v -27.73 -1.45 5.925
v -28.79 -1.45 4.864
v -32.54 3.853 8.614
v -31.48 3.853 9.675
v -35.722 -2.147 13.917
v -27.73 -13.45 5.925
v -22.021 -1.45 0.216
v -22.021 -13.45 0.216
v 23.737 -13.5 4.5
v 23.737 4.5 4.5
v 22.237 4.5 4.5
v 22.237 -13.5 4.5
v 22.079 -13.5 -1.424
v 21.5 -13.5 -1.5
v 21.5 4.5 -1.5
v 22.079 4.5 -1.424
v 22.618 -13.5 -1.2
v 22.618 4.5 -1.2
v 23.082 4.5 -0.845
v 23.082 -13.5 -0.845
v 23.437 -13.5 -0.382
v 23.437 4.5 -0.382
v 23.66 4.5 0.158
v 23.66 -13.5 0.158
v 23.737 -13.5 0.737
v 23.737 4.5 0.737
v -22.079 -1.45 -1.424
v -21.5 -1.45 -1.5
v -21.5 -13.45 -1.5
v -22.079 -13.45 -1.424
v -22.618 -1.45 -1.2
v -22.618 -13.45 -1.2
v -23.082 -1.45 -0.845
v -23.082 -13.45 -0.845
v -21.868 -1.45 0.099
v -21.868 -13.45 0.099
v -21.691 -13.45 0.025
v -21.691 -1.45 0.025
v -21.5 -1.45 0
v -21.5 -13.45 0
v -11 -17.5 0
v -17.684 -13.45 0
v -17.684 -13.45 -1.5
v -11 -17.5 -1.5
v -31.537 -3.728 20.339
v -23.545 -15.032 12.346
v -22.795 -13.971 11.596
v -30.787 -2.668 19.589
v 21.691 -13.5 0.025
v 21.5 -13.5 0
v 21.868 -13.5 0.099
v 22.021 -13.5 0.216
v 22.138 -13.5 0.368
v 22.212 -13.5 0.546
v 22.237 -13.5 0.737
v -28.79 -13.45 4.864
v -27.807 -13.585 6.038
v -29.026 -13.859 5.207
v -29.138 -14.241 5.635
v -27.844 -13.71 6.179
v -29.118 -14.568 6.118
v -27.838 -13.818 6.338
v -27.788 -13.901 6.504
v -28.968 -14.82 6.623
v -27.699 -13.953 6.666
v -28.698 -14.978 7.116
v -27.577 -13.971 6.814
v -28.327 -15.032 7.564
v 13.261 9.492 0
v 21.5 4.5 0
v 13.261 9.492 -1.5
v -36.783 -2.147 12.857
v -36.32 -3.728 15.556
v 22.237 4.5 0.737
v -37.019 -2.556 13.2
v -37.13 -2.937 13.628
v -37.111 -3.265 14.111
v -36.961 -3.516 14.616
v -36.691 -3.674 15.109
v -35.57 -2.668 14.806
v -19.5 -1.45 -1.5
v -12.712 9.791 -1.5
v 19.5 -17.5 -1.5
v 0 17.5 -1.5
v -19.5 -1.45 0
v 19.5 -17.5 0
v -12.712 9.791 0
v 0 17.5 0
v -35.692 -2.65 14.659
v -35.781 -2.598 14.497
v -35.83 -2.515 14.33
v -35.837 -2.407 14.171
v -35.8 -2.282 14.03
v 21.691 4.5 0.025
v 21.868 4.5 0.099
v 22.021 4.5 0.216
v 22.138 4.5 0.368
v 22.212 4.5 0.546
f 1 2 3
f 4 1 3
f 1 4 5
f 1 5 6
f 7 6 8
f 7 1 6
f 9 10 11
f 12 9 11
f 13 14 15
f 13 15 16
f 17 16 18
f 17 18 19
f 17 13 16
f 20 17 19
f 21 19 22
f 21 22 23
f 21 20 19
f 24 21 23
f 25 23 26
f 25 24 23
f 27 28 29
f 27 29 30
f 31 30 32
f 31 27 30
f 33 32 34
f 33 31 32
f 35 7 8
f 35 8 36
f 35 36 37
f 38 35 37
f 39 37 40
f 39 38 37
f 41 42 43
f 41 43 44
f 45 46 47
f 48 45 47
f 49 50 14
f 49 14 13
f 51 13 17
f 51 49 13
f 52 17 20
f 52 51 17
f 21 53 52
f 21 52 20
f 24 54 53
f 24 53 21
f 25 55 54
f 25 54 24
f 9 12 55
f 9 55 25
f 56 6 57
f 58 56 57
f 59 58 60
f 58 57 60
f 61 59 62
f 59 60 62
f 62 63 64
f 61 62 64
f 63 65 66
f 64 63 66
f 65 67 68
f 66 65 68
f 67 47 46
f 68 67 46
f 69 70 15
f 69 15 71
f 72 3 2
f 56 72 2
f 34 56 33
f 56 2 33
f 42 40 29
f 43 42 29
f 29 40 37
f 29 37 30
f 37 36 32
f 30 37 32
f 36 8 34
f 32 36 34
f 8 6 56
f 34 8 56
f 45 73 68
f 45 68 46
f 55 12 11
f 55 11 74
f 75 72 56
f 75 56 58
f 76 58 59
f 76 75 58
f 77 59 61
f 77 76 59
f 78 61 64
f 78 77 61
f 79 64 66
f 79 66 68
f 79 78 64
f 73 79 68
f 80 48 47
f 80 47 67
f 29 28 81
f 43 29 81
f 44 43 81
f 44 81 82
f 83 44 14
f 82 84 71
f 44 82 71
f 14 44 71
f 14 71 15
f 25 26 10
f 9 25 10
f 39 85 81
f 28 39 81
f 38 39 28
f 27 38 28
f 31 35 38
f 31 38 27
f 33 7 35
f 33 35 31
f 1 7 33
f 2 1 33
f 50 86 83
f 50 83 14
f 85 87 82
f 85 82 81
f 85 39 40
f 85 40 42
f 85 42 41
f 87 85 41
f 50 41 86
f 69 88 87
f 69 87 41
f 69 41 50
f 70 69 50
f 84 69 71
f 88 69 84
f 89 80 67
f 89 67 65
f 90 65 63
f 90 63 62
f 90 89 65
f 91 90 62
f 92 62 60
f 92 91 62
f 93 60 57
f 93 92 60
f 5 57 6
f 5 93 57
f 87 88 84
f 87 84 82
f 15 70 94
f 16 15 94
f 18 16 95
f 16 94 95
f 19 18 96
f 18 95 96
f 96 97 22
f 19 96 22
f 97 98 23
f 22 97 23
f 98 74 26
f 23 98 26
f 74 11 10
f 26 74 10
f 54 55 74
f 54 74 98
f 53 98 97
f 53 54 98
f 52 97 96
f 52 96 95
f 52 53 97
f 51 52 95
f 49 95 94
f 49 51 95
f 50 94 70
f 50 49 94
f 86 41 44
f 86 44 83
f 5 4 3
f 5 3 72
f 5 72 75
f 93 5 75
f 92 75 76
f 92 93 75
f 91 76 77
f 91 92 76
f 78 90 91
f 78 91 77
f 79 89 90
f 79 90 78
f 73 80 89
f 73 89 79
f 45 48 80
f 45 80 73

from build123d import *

# Parameters (mm, degrees)
CROQUIS1_W              = 43
CROQUIS1_H              = 35
BRIDA_BASE1_DEPTH       = 1.5
CROQUIS6_W              = 59.566817112
CROQUIS6_H              = 45.88022185
CORTAR_EXTRUIR1_DEPTH   = 10
BRIDA_DE_ARISTA1_DEPTH  = 18
BRIDA_DE_ARISTA2_DEPTH  = 12
CORTAR_EXTRUIR2_DEPTH   = 10
SALIENTE_EXTRUIR1_DEPTH = 1.5
CORTAR_EXTRUIR3_DEPTH   = 10
BRIDA_DE_ARISTA3_DEPTH  = 15.985281374


# Sheet-metal steps are written as plain solids
with BuildPart() as part:
    # Croquis1 → Brida base1 (new body)
    with BuildSketch(Plane.XY):
        Rectangle(CROQUIS1_W, CROQUIS1_H)
    extrude(amount=-BRIDA_BASE1_DEPTH)

    # Croquis6 → Cortar-Extruir1 (cut)
    with BuildSketch(Plane.XY):
        Rectangle(CROQUIS6_W, CROQUIS6_H)
        Polygon((19.5, -17.5), (21.5, -13.5), (21.5, 4.5), (13.260768396, 9.49227982), (0, 17.5), (-12.711890801, 9.791095082), (-19.5, -1.45), (-21.5, -1.45), (-21.5, -13.45), (-17.684098087, -13.45), (-11, -17.5), align=None, mode=Mode.SUBTRACT)
    extrude(amount=-CORTAR_EXTRUIR1_DEPTH, mode=Mode.SUBTRACT)

    # Brida de arista1 section (across the edge) → Brida de arista1 (add)
    with BuildSketch(Plane(origin=(22.2366, -13.5, 0), x_dir=(-1, 0, 0), z_dir=(0, 1, 0))):
        with BuildLine():
            Line((-1.5, 0.7366), (-1.5, 4.5))
            Line((-1.5, 4.5), (0, 4.5))
            Line((0, 4.5), (0, 0.7366))
            ThreePointArc((0, 0.7366), (0.215745145, 0.215745145), (0.7366, 0))
            Line((0.7366, 0), (0.7366, -1.5))
            ThreePointArc((0.7366, -1.5), (-0.844915027, -0.844915027), (-1.5, 0.7366))
        make_face()
    extrude(amount=BRIDA_DE_ARISTA1_DEPTH)

    # Brida de arista2 section (across the edge) → Brida de arista2 (add)
    with BuildSketch(Plane(origin=(-21.80510971, -1.45, 0), x_dir=(0.7071067811865438, 0, 0.7071067811865512), z_dir=(0, -1, 0))):
        with BuildLine():
            Line((-1.5, 0.30510971), (-1.5, 20.378679656))
            Line((-1.5, 20.378679656), (0, 20.378679656))
            Line((0, 20.378679656), (0, 0.30510971))
            ThreePointArc((0, 0.30510971), (0.056070336, 0.023225094), (0.215745145, -0.215745145))
            Line((0.215745145, -0.215745145), (-0.844915027, -1.276405317))
            ThreePointArc((-0.844915027, -1.276405317), (-1.329748962, -0.550800055), (-1.5, 0.30510971))
        make_face()
    extrude(amount=BRIDA_DE_ARISTA2_DEPTH)

    # Croquis13 → Cortar-Extruir2 (cut)
    with BuildSketch(Plane(origin=(-11.963215027, 0, -11.963215027), x_dir=(-0.7071067811865511, 0, 0.707106781186544), z_dir=(-0.707106781186544, 0, -0.7071067811865511))):
        Polygon((35.797220597, -1.45), (21.51312871, -15.734091887), (35.797220597, -15.734091887), align=None)
    extrude(amount=-CORTAR_EXTRUIR2_DEPTH, mode=Mode.SUBTRACT)

    # Croquis14 → Saliente-Extruir1 (add)
    with BuildSketch(Plane(origin=(-11.963215027, 0, -11.963215027), x_dir=(-0.7071067811865511, 0, 0.707106781186544), z_dir=(-0.707106781186544, 0, -0.7071067811865511))):
        Polygon((23.797220597, -1.45), (30.161181628, 4.913961031), (36.161181628, -1.086038969), (35.797220597, -1.45), align=None)
    extrude(amount=-SALIENTE_EXTRUIR1_DEPTH)

    # Croquis15 → Cortar-Extruir3 (cut)
    with BuildSketch(Plane(origin=(-11.963215027, 0, -11.963215027), x_dir=(-0.7071067811865511, 0, 0.707106781186544), z_dir=(-0.707106781186544, 0, -0.7071067811865511))):
        Polygon((30.161181628, 4.913961031), (36.161181628, -1.086038969), (35.100521456, -2.146699141), (29.100521456, 3.853300859), align=None)
    extrude(amount=-CORTAR_EXTRUIR3_DEPTH, mode=Mode.SUBTRACT)

    # Brida de arista3 section (across the edge) → Brida de arista3 (add)
    with BuildSketch(Plane(origin=(-36.0906716, -2.667553996, 14.28556189), x_dir=(0.5000000000000052, 0.7071067811865475, -0.499999999999995), z_dir=(0.5000000000000028, -0.7071067811865477, -0.49999999999999717))):
        with BuildLine():
            Line((-1.5, 0.7366), (-1.5, 7.5))
            Line((-1.5, 7.5), (0, 7.5))
            Line((0, 7.5), (0, 0.7366))
            ThreePointArc((0, 0.7366), (0.215745145, 0.215745145), (0.7366, 0))
            Line((0.7366, 0), (0.7366, -1.5))
            ThreePointArc((0.7366, -1.5), (-0.844915027, -0.844915027), (-1.5, 0.7366))
        make_face()
    extrude(amount=BRIDA_DE_ARISTA3_DEPTH)


solid = part.part
